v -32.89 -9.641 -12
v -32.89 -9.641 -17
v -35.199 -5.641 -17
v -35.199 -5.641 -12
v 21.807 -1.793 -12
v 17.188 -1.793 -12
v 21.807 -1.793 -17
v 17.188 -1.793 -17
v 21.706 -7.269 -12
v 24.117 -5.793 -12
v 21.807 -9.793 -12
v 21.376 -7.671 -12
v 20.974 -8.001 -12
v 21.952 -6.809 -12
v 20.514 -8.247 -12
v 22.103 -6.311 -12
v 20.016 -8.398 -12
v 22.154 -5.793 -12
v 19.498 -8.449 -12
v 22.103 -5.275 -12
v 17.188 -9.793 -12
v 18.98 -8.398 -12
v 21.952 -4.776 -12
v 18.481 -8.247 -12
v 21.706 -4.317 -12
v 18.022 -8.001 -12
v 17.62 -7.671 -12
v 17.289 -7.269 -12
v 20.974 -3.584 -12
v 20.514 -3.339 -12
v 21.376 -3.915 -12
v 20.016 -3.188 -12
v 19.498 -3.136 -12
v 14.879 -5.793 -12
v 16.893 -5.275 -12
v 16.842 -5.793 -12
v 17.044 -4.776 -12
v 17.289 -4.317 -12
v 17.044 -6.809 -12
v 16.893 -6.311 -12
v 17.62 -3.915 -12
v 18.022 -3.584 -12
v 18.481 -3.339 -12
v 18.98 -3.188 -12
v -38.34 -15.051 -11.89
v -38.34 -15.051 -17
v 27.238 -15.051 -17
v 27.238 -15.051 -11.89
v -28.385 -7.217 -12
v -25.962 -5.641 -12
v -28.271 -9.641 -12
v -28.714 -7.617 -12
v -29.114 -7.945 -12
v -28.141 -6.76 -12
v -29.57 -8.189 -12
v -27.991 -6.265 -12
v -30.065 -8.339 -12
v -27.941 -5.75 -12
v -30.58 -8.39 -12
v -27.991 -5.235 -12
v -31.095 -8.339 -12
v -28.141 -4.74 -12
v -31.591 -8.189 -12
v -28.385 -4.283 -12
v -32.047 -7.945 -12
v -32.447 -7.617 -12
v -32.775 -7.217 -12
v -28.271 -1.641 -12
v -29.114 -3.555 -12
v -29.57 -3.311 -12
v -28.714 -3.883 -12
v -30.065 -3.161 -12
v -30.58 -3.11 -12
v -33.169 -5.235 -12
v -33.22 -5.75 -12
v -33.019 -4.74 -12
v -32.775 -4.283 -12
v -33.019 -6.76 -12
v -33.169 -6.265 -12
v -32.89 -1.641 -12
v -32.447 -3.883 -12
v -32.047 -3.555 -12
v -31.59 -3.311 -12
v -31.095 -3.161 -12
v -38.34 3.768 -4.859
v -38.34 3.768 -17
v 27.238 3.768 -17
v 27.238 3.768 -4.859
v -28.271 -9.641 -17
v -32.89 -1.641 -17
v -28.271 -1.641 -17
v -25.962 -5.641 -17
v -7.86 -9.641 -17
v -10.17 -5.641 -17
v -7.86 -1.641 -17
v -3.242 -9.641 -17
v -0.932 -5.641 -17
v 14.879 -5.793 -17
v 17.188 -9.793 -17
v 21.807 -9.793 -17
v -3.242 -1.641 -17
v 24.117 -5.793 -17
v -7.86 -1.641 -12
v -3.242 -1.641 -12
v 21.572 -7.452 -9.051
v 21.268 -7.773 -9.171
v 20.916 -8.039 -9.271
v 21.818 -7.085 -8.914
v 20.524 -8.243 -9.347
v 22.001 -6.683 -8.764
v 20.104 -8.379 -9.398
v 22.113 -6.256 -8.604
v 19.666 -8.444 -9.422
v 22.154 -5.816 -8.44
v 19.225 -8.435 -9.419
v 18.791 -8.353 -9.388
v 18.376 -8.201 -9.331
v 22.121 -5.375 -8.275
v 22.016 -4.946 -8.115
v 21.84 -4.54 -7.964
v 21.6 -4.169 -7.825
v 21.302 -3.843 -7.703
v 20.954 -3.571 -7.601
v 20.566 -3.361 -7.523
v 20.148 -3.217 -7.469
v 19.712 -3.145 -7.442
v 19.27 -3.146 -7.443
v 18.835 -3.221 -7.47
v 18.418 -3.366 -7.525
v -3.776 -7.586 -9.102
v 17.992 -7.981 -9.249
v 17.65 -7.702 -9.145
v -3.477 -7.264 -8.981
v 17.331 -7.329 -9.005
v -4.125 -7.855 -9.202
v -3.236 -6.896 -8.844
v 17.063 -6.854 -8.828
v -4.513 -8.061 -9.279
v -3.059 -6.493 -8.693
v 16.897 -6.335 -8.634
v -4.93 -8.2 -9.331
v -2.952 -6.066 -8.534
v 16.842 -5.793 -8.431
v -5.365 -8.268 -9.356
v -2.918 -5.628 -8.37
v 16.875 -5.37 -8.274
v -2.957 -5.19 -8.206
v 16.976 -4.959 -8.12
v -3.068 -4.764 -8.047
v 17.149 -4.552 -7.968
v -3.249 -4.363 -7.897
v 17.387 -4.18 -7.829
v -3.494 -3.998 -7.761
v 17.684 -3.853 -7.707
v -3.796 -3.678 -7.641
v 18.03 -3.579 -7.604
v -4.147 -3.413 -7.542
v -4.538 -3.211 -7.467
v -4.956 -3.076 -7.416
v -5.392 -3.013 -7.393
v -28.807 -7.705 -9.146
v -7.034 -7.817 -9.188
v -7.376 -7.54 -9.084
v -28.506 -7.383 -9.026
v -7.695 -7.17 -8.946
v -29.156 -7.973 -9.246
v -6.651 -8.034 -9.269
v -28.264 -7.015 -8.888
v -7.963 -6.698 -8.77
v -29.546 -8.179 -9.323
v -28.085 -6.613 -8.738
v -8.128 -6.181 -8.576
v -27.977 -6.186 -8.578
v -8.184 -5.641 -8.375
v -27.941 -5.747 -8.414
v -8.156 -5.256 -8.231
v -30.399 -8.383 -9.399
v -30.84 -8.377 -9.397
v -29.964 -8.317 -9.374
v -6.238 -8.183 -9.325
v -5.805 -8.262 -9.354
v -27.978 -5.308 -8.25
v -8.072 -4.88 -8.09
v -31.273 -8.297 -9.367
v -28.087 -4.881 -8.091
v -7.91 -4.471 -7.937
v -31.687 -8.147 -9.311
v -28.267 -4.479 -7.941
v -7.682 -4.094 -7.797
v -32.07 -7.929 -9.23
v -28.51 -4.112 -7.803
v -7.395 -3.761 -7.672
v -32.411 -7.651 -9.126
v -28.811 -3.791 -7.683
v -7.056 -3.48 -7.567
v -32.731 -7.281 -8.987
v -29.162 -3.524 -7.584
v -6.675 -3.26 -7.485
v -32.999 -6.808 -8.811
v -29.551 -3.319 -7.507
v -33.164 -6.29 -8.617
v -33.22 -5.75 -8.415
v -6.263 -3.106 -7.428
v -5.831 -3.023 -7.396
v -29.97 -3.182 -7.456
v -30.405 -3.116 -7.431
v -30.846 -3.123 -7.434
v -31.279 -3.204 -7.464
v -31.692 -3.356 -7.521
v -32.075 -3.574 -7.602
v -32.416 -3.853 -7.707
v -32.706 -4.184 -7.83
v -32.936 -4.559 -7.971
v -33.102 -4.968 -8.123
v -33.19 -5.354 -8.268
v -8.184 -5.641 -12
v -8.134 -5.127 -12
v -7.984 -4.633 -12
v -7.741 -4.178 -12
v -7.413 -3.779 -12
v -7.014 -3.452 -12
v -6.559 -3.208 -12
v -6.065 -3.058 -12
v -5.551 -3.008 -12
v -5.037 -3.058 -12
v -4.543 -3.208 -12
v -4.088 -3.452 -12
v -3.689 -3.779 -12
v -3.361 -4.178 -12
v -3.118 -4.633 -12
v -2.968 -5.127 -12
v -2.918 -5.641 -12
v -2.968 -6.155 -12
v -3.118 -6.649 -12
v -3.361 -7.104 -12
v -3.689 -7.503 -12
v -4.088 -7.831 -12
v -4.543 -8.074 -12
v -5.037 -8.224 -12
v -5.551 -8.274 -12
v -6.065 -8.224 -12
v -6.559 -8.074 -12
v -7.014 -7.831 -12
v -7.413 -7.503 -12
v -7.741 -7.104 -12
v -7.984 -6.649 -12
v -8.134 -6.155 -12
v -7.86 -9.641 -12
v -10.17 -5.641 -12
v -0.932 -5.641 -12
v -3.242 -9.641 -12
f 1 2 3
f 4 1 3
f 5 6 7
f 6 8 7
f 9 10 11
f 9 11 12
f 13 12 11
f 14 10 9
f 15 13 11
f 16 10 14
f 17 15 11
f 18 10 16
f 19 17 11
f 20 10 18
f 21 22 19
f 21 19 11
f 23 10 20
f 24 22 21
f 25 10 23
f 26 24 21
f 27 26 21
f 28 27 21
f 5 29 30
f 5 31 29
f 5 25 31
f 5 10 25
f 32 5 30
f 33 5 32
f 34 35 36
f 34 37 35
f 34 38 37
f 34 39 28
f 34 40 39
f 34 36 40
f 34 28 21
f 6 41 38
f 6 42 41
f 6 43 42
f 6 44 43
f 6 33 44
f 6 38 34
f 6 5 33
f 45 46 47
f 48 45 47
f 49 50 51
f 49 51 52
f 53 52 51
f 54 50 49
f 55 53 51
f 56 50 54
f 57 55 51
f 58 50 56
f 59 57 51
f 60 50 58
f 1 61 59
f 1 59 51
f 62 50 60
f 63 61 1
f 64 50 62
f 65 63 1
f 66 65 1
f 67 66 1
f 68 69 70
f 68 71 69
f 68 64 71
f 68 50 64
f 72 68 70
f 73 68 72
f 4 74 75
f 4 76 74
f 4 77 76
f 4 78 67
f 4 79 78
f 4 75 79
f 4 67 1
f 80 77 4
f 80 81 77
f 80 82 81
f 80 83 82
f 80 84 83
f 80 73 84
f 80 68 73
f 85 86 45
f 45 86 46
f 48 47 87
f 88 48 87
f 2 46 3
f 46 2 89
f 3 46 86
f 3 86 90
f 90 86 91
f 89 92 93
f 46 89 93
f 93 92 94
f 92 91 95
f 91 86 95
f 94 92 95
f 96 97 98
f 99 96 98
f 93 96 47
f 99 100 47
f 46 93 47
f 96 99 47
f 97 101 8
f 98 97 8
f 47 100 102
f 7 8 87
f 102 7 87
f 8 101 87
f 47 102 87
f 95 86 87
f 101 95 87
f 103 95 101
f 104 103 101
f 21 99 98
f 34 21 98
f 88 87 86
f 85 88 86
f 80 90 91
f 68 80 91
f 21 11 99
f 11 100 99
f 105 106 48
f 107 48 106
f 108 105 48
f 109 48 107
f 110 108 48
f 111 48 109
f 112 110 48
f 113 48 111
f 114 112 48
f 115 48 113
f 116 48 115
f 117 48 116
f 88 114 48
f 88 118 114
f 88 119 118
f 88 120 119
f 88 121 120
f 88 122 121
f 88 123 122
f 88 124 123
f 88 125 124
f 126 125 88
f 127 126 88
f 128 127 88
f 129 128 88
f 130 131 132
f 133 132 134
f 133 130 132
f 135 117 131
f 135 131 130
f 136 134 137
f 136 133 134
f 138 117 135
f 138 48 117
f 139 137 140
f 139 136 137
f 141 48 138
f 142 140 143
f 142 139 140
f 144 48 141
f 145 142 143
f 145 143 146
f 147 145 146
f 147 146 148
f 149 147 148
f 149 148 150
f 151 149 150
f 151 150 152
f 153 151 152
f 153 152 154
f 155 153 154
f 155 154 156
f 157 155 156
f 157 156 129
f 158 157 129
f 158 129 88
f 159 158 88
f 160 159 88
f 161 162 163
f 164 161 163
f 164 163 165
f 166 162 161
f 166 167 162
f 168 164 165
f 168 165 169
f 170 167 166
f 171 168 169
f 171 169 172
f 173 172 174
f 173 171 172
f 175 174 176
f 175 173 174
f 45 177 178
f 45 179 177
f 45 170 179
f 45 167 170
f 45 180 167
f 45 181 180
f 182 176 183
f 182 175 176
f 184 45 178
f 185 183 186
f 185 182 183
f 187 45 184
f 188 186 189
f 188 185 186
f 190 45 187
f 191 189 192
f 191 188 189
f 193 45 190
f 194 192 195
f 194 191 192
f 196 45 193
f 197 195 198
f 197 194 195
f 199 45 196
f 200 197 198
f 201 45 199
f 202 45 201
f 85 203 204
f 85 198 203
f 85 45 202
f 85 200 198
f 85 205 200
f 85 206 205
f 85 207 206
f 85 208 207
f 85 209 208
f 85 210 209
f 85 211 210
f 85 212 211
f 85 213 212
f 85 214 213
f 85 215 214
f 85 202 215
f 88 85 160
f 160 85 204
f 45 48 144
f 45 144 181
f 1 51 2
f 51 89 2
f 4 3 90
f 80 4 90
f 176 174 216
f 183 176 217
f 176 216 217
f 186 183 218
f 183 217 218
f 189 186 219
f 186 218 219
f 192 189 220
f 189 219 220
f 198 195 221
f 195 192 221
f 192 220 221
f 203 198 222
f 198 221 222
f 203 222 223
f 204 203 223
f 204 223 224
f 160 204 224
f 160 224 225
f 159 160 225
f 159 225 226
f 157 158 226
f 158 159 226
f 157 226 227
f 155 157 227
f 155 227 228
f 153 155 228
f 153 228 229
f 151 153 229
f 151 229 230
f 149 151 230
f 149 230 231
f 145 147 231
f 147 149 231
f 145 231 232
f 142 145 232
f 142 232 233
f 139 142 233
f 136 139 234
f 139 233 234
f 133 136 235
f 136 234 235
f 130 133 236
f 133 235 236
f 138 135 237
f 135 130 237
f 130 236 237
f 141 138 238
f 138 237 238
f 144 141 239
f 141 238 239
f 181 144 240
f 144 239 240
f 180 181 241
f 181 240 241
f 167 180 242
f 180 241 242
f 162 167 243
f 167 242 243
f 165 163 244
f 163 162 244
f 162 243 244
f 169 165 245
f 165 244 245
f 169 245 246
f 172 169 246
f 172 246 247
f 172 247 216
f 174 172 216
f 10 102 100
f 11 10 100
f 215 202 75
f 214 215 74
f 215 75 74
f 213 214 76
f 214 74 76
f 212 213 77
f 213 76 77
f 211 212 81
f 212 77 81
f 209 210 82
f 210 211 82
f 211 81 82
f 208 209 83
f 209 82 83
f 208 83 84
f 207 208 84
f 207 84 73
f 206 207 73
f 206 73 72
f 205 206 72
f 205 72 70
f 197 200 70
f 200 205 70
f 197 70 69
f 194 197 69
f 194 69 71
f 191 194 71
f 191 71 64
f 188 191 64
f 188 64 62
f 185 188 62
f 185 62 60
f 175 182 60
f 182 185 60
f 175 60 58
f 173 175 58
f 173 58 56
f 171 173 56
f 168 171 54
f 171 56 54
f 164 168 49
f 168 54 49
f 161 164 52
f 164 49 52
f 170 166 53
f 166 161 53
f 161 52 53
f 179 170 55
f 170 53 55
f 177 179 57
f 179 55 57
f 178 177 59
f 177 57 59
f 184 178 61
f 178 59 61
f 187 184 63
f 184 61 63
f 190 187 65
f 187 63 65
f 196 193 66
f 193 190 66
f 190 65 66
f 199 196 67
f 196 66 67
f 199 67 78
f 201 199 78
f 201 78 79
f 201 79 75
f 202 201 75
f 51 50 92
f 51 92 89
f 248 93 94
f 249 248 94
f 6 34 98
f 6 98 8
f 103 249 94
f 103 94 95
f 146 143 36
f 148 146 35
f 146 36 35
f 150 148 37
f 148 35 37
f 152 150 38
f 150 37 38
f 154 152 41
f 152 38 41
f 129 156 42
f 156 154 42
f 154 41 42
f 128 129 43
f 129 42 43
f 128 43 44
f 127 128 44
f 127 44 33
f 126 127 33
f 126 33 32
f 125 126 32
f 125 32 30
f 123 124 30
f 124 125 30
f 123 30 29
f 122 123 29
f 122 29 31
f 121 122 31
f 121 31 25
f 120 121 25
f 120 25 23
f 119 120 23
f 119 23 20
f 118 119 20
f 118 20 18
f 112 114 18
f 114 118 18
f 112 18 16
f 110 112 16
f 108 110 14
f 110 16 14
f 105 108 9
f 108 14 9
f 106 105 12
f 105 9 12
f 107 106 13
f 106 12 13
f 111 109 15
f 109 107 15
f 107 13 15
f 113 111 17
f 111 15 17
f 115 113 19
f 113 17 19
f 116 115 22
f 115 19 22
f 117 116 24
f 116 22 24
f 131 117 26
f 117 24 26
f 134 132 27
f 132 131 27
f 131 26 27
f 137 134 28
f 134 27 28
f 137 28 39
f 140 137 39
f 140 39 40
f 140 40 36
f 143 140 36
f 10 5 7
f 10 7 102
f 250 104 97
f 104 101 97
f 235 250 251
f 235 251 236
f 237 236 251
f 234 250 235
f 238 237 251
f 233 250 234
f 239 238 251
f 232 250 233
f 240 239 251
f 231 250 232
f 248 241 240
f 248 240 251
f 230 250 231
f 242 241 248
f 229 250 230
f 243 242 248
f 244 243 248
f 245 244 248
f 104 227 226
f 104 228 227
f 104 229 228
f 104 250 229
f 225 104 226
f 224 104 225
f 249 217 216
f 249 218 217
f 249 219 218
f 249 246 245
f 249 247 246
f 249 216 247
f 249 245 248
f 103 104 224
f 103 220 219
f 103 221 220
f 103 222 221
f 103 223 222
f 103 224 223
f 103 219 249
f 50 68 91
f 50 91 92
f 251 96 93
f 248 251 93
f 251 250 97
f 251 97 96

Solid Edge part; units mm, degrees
sketch "Sketch1" plane through (0, 0, -17) normal (0, 0, -1) x (-1, 0, 0)
  circle A0 centre (30.5803, -5.7499) radius 2.6398
  line L0 (38.3399, -15.0506) -> (-27.2379, -15.0506)
  line L1 (-27.2379, -15.0506) -> (-27.2379, 3.7685)
  line L2 (-27.2379, 3.7685) -> (38.3399, 3.7685)
  line L3 (38.3399, 3.7685) -> (38.3399, -15.0506)
  circle A1 centre (5.551, -5.6411) radius 2.6333
  circle A2 centre (-19.4978, -5.7928) radius 2.6563
  dimension "D1" = 5.2666
  dimension "D2" = 5.3126
  dimension "D3" = 5.2796
  dimension "D4" = 65.5778
  dimension "D5" = 18.819
extrude "Protrusion1" add sketch "Sketch1" against normal blind 13
sketch "Sketch2" plane through (-38.3399, -5.6411, -10.5) normal (-1, 0, 0) x (0, 1, 0)
  line L0 (-9.4095, 1.3904) -> (9.4095, -5.6409)
  line L1 (9.4095, -6.5) -> (9.4095, -5.6409)
  line L2 (9.4095, -6.5) -> (-9.4095, -6.5)
  line L3 (-9.4095, -6.5) -> (-9.4095, 1.3904)
extrude "ExtrudedCutout_1" cut sketch "Sketch2" against normal blind 81
sketch "Sketch3" plane through (-5.551, -5.6411, -17) normal (0, 0, -1) x (0, 1, 0)
  circle A0 centre (0, 0) radius 2.6333
  line L0 (0, -4.6188) -> (4, -2.3094)
  line L1 (4, -2.3094) -> (4, 2.3094)
  line L2 (4, 2.3094) -> (0, 4.6188)
  line L3 (0, 4.6188) -> (-4, 2.3094)
  line L4 (-4, 2.3094) -> (-4, -2.3094)
  line L5 (-4, -2.3094) -> (0, -4.6188)
  circle A1 centre (-0.1517, 25.0488) radius 2.6563
  line L6 (-0.1517, 20.43) -> (3.8483, 22.7394)
  line L7 (3.8483, 22.7394) -> (3.8483, 27.3582)
  line L8 (3.8483, 27.3582) -> (-0.1517, 29.6676)
  line L9 (-0.1517, 29.6676) -> (-4.1517, 27.3582)
  line L10 (-4.1517, 27.3582) -> (-4.1517, 22.7394)
  line L11 (-4.1517, 22.7394) -> (-0.1517, 20.43)
  circle A2 centre (-0.1089, -25.0293) radius 2.6398
  line L12 (-4, -27.3387) -> (0, -29.6481)
  line L13 (0, -29.6481) -> (4, -27.3387)
  line L14 (4, -27.3387) -> (4, -22.7199)
  line L15 (4, -22.7199) -> (0, -20.4105)
  line L16 (0, -20.4105) -> (-4, -22.7199)
  line L17 (-4, -22.7199) -> (-4, -27.3387)
extrude "ExtrudedCutout_2" cut sketch "Sketch3" against normal blind 5
